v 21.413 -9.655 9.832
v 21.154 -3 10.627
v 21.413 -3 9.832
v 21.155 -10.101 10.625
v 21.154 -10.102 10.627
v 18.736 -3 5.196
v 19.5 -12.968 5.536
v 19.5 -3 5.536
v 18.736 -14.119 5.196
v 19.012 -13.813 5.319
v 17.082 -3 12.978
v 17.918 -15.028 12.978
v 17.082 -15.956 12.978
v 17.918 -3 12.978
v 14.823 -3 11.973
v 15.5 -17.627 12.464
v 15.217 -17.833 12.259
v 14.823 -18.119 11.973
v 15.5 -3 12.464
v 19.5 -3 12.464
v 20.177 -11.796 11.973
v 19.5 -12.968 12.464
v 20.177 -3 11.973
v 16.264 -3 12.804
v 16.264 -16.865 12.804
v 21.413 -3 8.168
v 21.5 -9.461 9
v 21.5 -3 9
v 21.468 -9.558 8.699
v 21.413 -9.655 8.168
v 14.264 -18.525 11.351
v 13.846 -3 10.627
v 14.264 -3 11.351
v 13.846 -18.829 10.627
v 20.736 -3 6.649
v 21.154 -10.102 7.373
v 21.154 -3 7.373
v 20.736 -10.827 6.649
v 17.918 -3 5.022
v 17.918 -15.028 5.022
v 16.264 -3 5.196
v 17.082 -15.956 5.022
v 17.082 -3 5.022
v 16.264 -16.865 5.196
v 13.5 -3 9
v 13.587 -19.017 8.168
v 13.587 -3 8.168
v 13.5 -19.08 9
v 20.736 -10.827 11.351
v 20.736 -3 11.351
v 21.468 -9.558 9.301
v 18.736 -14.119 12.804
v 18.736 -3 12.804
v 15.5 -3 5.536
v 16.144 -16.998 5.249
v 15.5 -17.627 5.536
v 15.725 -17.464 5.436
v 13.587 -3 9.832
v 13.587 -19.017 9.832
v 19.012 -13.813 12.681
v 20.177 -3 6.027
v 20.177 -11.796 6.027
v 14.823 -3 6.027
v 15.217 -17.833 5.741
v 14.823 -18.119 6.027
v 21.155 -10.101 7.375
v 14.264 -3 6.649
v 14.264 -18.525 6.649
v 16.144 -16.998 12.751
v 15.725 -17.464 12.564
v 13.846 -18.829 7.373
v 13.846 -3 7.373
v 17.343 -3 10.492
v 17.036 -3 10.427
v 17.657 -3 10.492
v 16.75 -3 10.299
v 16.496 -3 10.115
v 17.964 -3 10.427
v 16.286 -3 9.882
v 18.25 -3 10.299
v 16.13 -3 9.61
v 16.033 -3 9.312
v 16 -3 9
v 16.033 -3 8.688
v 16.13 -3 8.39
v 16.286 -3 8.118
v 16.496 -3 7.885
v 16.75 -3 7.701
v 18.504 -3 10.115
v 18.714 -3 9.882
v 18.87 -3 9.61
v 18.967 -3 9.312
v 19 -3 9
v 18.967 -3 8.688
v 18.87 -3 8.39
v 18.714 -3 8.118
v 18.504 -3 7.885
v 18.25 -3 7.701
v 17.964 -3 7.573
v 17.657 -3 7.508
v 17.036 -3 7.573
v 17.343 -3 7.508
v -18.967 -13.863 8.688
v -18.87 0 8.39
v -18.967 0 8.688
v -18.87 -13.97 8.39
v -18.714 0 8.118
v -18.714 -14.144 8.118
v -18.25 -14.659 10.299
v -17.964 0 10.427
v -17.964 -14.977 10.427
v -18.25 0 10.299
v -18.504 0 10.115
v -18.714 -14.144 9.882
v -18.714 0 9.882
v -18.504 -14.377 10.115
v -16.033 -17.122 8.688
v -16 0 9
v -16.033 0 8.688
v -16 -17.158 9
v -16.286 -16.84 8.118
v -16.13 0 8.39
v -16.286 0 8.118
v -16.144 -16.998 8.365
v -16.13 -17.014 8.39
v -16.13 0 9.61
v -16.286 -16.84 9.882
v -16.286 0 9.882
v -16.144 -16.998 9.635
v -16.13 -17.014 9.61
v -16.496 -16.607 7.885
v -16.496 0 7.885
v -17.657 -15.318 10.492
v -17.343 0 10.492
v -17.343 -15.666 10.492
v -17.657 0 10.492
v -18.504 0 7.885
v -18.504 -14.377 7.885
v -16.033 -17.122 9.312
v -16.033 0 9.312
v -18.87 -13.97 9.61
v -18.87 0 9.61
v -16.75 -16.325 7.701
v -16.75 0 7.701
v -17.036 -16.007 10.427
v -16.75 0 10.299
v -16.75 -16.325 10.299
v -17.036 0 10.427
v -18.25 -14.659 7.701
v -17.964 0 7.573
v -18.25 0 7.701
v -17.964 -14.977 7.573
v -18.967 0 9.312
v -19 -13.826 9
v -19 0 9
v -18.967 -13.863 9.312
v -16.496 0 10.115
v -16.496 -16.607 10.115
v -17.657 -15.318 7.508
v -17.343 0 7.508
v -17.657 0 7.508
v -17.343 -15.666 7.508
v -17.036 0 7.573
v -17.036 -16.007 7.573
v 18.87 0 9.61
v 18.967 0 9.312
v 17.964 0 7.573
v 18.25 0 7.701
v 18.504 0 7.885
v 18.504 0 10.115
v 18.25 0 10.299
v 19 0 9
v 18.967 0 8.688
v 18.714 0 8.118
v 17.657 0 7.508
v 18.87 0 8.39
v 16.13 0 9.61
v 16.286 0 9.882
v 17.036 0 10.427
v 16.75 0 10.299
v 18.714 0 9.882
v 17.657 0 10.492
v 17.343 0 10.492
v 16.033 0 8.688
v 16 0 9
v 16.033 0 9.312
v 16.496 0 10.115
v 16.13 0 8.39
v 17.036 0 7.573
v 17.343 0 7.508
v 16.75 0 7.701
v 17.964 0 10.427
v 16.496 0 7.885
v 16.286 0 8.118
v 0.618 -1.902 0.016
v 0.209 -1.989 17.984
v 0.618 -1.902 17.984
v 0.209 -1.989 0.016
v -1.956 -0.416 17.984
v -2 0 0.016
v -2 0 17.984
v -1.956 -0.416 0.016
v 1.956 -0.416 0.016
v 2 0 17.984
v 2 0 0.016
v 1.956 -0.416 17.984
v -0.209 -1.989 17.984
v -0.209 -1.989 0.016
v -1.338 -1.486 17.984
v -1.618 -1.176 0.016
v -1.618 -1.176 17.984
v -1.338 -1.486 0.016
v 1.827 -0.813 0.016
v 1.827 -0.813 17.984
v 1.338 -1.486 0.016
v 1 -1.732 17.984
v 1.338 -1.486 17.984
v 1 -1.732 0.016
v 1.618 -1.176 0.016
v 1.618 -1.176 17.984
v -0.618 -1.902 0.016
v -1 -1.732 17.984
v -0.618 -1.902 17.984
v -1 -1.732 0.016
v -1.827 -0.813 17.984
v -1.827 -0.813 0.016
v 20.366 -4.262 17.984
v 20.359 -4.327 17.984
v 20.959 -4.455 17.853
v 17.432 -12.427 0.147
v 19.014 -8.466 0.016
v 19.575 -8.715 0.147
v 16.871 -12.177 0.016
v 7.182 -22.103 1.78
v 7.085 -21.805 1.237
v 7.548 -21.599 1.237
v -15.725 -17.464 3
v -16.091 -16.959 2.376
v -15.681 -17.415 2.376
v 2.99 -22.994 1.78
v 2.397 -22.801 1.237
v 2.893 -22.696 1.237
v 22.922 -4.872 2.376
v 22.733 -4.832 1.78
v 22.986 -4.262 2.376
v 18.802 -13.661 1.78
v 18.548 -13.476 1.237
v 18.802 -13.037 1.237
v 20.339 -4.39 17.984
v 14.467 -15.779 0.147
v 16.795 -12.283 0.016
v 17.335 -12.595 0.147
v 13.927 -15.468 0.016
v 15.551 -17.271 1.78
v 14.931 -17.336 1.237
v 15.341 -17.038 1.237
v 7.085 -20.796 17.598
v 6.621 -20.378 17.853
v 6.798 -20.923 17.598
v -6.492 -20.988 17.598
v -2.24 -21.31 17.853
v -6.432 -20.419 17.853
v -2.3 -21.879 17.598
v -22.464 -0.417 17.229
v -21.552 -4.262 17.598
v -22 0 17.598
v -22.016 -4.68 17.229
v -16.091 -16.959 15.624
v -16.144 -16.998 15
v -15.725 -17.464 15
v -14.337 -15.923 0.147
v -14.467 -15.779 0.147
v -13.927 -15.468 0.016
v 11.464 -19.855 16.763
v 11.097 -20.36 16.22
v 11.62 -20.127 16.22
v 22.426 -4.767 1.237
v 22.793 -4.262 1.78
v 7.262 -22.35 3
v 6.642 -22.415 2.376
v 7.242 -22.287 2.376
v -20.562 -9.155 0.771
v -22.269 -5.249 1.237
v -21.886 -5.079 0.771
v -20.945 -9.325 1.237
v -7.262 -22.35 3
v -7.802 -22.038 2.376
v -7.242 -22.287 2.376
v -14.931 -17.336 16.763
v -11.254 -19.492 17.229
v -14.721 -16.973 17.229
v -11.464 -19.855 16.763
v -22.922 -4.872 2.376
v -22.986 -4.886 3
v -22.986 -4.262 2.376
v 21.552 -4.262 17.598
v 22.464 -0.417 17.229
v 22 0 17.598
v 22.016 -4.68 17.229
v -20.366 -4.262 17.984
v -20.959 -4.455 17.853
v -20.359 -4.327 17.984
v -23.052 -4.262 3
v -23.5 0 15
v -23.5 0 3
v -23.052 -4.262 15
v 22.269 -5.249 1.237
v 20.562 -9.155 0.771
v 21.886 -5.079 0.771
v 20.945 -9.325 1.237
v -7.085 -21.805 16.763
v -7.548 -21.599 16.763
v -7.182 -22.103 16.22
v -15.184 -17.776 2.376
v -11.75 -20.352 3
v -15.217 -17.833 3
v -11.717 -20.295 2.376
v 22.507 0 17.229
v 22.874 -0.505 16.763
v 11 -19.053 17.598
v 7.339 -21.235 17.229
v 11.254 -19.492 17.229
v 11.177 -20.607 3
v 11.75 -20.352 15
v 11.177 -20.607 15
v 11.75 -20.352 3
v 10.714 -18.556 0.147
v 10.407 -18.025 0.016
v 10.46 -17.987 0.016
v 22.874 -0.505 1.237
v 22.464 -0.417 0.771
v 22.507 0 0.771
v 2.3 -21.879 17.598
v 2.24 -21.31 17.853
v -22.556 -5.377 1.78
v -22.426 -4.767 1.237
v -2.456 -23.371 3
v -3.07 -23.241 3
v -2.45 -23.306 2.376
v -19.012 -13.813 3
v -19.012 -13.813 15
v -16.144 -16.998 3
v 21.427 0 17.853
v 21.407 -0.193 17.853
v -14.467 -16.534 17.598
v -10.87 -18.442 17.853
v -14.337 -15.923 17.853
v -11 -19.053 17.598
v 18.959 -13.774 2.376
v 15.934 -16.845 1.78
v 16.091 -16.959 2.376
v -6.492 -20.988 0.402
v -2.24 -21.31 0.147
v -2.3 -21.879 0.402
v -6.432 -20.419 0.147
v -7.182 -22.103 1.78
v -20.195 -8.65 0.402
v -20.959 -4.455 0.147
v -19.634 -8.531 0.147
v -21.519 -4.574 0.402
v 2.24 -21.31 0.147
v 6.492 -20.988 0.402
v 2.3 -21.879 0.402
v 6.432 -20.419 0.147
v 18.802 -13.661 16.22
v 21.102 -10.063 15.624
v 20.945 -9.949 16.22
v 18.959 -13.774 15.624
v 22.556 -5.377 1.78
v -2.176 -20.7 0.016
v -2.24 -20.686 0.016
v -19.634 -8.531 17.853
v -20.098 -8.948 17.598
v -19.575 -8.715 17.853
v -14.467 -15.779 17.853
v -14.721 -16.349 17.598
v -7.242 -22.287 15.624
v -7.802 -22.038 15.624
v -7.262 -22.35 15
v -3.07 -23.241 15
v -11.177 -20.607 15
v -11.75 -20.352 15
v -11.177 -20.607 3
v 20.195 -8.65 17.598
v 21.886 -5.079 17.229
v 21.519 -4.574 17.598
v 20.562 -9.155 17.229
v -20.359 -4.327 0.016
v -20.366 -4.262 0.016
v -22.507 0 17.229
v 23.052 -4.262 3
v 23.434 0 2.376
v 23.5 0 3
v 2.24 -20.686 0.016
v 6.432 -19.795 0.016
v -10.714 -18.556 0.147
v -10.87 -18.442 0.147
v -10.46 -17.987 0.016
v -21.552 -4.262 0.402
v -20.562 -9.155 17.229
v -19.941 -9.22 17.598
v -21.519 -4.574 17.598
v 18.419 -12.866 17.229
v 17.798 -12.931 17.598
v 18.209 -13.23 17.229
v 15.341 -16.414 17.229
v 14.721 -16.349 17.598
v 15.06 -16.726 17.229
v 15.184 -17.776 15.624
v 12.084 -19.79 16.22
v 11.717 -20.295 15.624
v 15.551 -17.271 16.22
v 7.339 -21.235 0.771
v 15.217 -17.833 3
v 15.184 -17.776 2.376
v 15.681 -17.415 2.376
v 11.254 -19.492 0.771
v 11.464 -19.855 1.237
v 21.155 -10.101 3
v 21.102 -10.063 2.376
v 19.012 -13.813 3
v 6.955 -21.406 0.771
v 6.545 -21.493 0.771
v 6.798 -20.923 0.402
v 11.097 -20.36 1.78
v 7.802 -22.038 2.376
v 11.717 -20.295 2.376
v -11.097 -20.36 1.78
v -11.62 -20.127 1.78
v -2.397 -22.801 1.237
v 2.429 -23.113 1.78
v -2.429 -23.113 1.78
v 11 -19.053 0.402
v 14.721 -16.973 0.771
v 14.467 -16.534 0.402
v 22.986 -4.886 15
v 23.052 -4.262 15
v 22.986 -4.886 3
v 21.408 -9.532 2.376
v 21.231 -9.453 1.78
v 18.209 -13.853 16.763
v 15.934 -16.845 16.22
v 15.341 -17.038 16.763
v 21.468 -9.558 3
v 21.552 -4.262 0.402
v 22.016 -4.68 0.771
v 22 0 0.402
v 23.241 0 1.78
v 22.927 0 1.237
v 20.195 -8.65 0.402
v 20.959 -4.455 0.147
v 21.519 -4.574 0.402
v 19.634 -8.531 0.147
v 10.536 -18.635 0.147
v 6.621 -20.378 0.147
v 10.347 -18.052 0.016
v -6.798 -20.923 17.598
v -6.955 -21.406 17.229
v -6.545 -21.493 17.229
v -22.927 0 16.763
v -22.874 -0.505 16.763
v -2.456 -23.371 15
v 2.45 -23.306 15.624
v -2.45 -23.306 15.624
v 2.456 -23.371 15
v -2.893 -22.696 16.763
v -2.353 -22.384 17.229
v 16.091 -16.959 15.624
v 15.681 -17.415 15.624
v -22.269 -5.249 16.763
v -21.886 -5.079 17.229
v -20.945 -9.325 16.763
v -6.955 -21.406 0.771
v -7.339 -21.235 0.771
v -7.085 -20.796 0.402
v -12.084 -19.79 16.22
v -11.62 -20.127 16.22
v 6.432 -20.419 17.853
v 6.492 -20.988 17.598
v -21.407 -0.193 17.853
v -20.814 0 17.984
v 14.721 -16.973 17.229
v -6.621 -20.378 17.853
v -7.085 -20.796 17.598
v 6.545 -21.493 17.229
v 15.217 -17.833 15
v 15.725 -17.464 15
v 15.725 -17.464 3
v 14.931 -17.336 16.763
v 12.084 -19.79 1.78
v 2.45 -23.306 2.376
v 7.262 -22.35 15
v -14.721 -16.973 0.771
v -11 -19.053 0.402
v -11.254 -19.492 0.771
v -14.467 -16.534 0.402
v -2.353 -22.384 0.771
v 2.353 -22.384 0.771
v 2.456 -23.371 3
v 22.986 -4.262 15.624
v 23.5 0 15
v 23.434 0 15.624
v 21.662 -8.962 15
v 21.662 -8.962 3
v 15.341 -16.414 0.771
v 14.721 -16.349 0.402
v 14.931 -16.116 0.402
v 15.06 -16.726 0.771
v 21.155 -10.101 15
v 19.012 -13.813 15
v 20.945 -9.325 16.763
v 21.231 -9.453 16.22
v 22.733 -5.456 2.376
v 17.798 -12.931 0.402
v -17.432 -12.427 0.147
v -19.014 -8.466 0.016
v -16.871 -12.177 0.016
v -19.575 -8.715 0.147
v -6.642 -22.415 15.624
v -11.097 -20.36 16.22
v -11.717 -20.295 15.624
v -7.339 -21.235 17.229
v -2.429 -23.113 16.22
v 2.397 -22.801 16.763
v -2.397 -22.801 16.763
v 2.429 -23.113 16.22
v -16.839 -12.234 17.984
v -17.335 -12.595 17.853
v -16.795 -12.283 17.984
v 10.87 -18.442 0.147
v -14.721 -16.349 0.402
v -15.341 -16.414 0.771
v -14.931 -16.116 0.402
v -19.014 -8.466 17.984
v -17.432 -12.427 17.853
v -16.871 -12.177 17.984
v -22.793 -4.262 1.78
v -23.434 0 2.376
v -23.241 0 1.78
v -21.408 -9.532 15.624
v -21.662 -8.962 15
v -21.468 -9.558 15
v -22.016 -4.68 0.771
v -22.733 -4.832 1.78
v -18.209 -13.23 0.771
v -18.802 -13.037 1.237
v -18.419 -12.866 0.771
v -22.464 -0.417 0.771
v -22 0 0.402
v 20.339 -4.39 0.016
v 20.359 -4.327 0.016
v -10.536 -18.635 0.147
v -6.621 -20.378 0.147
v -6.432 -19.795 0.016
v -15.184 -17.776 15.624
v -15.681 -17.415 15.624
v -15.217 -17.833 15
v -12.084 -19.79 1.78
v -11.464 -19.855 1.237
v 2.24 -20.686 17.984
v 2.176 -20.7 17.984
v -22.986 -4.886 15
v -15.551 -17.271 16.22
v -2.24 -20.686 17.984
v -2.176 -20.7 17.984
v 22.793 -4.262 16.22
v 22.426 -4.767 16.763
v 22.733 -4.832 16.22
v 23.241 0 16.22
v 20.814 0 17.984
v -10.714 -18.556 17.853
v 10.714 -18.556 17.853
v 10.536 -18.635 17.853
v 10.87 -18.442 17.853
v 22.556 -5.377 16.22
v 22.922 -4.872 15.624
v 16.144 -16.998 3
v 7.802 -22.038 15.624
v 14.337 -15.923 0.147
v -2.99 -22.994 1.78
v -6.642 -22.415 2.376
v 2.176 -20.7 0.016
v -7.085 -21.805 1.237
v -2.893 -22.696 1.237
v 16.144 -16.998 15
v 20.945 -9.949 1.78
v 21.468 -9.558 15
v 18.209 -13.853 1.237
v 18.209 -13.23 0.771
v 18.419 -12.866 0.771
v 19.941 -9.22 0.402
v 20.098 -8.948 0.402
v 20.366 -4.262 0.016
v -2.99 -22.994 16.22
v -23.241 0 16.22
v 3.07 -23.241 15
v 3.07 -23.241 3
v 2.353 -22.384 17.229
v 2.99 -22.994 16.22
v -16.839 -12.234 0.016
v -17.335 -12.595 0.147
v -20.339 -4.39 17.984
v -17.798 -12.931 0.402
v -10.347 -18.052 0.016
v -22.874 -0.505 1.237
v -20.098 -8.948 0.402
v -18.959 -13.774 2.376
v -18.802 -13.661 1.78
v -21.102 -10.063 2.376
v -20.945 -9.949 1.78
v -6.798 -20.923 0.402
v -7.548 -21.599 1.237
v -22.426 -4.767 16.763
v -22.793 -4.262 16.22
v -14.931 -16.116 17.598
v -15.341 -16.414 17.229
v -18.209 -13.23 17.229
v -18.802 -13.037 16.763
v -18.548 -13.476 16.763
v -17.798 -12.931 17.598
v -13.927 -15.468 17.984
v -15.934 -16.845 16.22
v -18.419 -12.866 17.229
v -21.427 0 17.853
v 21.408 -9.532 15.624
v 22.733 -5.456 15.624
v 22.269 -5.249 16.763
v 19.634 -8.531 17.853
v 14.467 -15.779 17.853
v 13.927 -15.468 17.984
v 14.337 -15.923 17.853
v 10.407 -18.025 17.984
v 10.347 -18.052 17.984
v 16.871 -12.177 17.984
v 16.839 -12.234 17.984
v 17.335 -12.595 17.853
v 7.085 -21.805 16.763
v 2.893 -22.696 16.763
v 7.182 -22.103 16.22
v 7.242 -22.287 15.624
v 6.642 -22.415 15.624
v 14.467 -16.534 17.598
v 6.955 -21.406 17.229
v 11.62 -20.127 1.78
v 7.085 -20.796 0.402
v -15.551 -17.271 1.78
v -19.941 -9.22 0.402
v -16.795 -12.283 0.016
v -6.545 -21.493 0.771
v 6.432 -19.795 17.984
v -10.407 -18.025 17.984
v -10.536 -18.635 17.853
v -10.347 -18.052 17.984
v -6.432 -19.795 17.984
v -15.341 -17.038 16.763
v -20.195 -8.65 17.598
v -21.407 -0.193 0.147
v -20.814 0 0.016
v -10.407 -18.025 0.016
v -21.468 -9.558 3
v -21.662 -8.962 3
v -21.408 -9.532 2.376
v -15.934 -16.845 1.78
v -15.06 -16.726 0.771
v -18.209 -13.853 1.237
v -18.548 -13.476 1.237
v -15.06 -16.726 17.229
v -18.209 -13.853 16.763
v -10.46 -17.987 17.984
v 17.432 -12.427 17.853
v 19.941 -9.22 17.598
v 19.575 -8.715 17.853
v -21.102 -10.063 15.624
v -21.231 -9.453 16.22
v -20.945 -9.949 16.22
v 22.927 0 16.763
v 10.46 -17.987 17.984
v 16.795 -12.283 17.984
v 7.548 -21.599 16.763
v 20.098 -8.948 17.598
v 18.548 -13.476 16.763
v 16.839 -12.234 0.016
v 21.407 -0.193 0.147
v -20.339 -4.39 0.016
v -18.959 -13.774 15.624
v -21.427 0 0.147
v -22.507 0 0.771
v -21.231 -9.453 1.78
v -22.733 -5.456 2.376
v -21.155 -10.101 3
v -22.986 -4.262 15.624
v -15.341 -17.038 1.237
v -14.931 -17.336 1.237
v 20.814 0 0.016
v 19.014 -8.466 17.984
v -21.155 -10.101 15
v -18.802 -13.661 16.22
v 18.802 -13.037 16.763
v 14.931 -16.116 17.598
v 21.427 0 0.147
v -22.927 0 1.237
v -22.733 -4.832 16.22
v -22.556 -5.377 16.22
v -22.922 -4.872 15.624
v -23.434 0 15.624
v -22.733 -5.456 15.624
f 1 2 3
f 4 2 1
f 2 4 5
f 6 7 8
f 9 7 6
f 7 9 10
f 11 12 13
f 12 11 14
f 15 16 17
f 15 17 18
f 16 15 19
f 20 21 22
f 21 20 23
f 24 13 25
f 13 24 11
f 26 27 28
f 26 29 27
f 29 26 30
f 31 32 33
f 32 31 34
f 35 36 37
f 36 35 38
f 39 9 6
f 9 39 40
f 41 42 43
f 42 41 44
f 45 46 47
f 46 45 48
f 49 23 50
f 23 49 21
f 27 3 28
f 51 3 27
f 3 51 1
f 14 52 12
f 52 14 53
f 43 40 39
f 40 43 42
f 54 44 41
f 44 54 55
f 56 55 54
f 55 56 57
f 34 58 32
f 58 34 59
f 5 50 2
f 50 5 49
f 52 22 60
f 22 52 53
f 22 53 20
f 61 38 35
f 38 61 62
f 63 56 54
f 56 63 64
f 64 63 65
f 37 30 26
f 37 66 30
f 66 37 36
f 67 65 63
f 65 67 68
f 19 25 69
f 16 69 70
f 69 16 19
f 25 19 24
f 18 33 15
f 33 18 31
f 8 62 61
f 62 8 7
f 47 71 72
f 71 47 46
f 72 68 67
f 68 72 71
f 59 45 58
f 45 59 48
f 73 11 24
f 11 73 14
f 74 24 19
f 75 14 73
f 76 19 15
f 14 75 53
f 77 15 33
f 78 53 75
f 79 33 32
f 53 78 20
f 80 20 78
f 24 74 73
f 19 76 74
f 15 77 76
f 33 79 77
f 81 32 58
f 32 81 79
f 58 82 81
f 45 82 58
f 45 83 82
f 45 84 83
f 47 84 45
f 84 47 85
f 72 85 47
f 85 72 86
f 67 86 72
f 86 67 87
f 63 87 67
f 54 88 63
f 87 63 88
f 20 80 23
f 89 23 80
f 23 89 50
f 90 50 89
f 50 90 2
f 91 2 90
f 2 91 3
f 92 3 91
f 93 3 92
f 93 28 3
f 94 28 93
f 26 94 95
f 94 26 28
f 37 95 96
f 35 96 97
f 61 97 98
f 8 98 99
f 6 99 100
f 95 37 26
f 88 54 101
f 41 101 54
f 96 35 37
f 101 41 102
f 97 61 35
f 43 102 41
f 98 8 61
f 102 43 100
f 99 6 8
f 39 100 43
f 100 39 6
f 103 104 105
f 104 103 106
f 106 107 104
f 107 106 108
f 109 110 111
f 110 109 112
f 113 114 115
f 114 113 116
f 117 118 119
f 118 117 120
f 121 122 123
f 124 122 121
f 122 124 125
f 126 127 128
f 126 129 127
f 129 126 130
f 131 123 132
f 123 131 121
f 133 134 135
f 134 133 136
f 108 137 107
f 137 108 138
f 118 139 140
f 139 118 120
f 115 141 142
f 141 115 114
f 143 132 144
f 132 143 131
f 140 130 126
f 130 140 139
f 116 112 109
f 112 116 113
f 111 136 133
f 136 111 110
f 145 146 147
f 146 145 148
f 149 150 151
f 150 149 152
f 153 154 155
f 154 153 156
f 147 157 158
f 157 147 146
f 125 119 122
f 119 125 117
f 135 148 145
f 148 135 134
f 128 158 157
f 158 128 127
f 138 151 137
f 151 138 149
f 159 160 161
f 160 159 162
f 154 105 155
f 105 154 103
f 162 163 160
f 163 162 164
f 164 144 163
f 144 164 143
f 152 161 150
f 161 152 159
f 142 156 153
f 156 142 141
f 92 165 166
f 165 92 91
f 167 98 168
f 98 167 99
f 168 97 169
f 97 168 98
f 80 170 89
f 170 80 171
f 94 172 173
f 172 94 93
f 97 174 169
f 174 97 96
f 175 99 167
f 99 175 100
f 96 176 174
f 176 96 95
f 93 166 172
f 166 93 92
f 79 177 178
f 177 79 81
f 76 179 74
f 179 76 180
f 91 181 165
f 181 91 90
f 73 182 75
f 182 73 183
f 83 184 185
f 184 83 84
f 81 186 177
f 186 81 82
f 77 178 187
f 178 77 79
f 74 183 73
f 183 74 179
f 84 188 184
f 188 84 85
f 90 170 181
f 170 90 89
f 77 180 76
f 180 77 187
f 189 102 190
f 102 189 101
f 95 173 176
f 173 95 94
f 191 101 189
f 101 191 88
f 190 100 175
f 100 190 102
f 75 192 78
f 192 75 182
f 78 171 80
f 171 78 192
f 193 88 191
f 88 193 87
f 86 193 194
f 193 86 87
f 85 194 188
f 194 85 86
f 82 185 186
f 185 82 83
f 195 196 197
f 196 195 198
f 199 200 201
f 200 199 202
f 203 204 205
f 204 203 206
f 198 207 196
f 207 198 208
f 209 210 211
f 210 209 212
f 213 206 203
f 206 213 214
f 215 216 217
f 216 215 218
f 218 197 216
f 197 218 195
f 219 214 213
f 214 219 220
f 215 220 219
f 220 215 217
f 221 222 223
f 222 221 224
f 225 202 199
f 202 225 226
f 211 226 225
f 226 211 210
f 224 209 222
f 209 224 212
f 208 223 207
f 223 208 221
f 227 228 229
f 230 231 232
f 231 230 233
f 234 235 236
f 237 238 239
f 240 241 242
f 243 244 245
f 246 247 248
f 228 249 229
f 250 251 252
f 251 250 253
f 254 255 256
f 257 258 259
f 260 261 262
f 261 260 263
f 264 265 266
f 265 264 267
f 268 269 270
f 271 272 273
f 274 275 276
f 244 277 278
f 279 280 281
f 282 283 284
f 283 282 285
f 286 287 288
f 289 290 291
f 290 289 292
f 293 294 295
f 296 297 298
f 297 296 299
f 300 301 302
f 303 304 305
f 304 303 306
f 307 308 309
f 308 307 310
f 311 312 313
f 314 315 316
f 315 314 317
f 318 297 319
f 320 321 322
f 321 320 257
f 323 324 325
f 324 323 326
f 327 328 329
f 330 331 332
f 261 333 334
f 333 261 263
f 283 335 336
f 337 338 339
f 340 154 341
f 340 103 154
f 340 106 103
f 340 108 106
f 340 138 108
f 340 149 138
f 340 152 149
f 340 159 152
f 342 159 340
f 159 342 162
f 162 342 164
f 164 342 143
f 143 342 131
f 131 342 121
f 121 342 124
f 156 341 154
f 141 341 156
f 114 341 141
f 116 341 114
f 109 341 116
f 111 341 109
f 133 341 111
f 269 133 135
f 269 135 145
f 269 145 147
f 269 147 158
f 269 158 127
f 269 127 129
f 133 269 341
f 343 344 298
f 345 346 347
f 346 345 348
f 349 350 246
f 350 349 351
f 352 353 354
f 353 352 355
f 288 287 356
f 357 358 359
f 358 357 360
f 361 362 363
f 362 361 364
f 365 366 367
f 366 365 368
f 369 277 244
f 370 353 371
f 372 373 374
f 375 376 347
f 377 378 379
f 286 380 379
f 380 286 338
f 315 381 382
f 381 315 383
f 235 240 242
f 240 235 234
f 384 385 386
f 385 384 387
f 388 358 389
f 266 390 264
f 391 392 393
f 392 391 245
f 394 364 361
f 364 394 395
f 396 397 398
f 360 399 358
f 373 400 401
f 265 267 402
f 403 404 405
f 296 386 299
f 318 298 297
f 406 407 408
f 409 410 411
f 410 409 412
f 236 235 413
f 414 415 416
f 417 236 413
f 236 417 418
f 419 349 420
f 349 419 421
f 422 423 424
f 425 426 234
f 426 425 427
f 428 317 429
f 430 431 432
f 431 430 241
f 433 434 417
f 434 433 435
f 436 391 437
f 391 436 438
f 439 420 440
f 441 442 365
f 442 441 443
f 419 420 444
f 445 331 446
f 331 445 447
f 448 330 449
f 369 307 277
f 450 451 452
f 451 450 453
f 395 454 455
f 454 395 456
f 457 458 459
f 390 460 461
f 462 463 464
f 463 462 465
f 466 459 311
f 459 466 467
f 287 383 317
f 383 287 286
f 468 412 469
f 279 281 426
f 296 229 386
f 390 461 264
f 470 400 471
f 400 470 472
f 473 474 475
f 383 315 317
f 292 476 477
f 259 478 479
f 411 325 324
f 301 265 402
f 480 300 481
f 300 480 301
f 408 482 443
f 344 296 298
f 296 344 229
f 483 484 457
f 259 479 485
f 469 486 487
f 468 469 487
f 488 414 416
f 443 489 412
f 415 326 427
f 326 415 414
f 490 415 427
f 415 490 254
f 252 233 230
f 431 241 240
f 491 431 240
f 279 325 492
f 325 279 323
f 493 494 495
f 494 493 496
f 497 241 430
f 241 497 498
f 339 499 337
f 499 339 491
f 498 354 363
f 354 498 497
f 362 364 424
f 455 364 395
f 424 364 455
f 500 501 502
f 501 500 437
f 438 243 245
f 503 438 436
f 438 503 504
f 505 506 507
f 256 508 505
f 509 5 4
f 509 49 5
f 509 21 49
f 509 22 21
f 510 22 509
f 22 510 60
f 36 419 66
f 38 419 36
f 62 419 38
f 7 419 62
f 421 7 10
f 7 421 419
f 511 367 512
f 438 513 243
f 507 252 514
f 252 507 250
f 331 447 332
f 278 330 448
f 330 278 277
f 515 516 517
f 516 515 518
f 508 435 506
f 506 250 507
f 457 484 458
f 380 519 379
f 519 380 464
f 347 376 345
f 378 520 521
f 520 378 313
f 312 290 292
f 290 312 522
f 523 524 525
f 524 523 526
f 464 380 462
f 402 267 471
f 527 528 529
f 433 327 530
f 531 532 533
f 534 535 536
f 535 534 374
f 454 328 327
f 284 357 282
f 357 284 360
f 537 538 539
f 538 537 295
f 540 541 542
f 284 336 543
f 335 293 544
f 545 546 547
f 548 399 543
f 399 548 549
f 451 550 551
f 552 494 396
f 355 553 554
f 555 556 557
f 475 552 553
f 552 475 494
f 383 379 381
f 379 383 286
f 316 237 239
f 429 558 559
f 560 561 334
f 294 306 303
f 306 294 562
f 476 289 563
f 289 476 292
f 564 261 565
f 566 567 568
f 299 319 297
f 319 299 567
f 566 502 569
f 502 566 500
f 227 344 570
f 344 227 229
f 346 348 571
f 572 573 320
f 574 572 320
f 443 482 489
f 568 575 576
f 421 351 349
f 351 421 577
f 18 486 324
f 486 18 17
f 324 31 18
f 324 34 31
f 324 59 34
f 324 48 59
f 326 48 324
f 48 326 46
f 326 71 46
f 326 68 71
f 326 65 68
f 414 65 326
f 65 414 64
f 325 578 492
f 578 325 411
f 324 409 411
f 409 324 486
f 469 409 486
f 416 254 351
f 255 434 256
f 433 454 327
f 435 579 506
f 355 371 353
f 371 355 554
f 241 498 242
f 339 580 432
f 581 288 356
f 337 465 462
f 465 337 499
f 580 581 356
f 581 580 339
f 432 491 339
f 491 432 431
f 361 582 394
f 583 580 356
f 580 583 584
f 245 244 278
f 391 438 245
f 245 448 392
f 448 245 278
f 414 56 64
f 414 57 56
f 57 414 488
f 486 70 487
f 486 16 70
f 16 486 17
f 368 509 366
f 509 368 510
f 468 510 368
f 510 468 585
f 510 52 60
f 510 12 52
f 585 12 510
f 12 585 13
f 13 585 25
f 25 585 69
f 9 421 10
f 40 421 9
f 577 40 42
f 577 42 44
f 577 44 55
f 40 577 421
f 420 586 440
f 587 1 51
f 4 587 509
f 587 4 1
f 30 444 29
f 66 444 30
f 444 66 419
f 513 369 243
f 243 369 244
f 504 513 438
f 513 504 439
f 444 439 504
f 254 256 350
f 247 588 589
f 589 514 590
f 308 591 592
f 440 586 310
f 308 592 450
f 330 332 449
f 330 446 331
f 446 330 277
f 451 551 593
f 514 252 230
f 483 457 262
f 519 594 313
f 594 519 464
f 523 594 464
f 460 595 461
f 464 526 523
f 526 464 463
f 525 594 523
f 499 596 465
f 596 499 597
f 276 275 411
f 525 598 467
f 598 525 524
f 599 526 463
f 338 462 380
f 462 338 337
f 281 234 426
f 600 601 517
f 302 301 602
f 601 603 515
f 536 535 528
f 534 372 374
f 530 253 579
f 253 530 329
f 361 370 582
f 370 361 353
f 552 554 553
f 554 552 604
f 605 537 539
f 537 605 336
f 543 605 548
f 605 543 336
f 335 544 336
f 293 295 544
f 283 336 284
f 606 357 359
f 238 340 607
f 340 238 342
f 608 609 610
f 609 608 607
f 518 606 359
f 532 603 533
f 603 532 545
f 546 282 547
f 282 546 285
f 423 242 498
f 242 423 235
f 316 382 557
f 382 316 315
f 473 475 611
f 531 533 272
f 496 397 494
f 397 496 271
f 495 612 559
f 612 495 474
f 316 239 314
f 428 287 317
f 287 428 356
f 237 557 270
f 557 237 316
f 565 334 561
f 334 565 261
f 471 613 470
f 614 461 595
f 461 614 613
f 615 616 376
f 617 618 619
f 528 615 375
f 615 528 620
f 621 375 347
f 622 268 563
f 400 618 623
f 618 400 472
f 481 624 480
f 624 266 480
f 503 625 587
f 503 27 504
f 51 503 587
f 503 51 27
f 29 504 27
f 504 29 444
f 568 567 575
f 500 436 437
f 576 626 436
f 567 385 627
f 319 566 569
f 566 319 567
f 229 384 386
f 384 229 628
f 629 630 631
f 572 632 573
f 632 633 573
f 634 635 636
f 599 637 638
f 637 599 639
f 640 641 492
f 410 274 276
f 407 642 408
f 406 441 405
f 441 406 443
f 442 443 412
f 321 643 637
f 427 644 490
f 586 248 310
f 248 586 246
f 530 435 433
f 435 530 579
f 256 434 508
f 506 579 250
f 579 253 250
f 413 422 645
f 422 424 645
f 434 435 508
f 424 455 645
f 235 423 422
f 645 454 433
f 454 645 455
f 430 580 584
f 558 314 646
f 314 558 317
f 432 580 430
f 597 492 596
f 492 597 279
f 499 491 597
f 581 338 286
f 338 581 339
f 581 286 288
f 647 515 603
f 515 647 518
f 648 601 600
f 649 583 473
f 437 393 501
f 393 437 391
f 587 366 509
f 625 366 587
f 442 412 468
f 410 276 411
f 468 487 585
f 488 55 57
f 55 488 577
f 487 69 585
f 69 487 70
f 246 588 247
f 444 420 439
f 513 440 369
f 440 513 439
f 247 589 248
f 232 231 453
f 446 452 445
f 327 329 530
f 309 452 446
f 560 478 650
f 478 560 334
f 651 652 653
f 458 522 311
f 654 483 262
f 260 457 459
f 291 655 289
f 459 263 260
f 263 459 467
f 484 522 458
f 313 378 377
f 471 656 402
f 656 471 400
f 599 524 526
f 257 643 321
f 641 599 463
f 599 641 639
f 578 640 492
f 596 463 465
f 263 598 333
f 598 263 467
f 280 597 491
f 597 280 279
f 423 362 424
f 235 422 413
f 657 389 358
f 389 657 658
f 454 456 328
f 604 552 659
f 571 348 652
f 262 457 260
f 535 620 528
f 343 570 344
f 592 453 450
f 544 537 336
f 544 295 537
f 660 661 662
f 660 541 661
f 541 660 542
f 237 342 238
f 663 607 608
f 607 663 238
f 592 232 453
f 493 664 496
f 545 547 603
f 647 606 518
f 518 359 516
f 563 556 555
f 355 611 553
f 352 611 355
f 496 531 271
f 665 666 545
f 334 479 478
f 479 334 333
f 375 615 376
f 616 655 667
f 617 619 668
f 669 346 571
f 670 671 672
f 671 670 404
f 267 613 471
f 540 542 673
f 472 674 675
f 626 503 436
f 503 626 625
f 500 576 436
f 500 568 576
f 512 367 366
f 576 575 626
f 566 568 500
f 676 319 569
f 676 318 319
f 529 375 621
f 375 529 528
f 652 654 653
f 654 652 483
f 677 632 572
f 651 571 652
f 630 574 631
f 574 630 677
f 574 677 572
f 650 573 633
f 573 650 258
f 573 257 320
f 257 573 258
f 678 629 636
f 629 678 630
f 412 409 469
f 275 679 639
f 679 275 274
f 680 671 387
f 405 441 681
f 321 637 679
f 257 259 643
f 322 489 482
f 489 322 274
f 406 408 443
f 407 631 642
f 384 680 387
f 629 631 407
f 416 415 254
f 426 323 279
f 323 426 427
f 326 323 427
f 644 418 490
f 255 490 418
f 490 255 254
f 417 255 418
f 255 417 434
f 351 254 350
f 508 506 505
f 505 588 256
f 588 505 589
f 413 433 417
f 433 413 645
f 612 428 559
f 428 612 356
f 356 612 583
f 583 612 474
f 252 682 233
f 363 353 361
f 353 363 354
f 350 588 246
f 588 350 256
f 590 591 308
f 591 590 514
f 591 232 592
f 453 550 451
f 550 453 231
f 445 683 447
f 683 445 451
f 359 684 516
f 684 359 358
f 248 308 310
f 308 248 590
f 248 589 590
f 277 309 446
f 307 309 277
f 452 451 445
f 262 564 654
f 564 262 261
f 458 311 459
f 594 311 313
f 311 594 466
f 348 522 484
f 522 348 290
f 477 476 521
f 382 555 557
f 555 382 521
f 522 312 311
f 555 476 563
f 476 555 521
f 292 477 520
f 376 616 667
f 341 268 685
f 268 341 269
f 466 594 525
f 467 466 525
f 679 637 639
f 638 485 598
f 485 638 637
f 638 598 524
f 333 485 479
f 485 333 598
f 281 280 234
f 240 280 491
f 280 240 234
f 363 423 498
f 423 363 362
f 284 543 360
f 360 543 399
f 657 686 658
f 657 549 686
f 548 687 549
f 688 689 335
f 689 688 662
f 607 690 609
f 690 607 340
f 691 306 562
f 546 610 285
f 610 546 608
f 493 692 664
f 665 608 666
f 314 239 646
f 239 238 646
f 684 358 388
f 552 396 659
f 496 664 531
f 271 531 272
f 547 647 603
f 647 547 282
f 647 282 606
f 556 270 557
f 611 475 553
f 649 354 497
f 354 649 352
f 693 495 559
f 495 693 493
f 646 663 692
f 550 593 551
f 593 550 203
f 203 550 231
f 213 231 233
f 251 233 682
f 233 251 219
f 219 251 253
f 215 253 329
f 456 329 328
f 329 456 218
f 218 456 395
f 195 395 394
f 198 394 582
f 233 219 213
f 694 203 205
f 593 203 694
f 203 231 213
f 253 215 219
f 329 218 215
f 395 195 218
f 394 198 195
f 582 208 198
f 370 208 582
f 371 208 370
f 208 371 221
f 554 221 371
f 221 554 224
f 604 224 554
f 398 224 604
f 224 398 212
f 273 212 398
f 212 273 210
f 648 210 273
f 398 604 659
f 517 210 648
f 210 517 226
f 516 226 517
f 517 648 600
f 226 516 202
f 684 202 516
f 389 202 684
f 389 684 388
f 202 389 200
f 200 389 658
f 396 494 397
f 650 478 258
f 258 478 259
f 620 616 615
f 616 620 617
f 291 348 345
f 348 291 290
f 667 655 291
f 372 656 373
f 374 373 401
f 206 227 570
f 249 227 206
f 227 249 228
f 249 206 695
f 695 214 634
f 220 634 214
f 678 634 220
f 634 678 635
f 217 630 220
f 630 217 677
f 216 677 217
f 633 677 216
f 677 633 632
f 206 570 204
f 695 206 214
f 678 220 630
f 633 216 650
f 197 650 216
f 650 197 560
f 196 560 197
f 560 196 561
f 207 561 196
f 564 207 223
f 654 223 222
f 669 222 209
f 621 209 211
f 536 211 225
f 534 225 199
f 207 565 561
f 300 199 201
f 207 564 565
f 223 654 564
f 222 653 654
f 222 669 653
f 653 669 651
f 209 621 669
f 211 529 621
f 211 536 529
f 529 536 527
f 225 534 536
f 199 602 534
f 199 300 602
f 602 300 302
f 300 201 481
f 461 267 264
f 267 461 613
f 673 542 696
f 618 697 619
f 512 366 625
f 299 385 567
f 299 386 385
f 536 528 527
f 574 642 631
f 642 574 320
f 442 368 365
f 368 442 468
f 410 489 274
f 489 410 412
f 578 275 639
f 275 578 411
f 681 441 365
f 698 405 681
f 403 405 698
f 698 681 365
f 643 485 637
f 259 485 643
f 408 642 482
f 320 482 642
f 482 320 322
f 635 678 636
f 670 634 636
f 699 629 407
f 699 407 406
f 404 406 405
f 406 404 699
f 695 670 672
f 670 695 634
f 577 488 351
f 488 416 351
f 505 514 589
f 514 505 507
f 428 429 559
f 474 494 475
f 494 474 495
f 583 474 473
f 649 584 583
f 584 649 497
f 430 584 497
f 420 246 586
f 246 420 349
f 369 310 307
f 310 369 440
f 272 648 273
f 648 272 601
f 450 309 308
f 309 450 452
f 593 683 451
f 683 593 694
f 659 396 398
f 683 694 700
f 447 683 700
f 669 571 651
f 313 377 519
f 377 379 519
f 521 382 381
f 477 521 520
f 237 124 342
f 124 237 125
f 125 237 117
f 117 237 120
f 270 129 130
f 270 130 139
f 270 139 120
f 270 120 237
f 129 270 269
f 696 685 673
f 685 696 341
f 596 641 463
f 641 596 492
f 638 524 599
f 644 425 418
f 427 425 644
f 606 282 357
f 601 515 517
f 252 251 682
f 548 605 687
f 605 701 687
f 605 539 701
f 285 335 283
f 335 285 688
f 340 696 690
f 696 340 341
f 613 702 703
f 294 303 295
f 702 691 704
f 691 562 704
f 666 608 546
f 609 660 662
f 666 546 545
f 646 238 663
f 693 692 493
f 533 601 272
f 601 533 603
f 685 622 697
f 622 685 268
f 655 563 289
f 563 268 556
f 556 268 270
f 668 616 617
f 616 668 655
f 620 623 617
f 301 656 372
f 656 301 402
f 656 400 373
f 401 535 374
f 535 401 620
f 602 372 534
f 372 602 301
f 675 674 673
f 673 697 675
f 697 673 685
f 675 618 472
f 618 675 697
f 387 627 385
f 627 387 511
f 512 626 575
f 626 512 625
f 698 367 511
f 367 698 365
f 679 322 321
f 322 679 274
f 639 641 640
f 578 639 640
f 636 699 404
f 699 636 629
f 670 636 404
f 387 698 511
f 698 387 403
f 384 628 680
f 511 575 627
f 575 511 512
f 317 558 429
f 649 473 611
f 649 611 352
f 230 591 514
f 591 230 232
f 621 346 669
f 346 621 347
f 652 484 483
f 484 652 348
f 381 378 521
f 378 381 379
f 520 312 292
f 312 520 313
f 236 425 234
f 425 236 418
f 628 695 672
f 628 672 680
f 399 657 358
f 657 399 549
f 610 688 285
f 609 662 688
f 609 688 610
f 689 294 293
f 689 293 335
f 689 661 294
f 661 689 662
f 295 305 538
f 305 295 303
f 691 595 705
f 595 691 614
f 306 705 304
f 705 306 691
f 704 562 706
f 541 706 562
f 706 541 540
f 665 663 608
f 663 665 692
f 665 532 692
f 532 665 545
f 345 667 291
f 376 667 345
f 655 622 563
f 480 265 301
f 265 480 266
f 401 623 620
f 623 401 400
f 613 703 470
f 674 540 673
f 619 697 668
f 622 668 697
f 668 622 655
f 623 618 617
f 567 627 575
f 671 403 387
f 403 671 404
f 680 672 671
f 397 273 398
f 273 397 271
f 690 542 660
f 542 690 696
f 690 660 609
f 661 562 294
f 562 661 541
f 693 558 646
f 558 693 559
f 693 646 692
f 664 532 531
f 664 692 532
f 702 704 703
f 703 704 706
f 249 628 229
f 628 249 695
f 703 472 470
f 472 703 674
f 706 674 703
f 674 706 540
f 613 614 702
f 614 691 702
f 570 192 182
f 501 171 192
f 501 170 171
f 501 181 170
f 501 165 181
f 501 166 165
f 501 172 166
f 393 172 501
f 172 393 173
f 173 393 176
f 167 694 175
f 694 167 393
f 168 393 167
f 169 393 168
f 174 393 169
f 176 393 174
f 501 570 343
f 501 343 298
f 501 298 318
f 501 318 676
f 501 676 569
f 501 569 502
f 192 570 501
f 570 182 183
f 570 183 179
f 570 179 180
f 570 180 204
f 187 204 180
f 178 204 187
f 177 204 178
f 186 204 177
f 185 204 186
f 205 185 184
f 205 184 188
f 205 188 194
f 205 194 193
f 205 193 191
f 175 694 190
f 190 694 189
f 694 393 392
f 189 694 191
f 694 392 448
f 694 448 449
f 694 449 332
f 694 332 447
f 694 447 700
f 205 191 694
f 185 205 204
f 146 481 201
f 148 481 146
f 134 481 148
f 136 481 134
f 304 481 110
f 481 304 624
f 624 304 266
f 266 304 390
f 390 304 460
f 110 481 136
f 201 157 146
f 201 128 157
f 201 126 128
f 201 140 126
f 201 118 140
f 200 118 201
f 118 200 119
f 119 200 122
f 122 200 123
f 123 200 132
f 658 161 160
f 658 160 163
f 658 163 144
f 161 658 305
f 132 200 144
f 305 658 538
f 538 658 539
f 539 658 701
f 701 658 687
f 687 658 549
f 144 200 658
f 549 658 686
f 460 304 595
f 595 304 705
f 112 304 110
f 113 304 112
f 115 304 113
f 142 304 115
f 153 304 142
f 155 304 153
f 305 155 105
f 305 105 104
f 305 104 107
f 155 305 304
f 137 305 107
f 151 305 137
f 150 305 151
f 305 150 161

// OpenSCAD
wheelWidth = 18;
wheelHoleSize = 4;
wheelOuter = 47;

screwOffsetFromEdge = wheelWidth / 3;

$fn = 30;


module fullWheel() {
    difference() {
        union() {
            translate([0,0,3]) {
                minkowski() {
                    cylinder(d=wheelOuter-6, h=wheelWidth-6 );
                    sphere(r=3);
                }
            }
        }
        union() {
            cylinder(d=wheelHoleSize, h=wheelWidth );
            
            // Add a M3 hole all the way through either side of the middle.
            
            rotate([90,0,0]) {
                // Screw head hollow out.
                translate([(wheelOuter/2 -screwOffsetFromEdge), wheelWidth/2, 3]) {
                    #cylinder(d=8, h= 25 );
                }
                
                // Through holes.
                translate([-(wheelOuter/2 -screwOffsetFromEdge), wheelWidth/2, -wheelOuter/2]) {
                    #cylinder(d=3, h=wheelOuter +10 );
                }
                
                translate([(wheelOuter/2 -screwOffsetFromEdge), wheelWidth/2, -wheelOuter/2]) {
                    #cylinder(d=3, h=wheelOuter +10 );
                }
            }
            translate([-(wheelOuter +10), 0, 0]) {
            }
        }
    }
}

difference() {
    union() {
        fullWheel();
    }
    union() {
        // Chop off half the wheel 
        translate([-(wheelOuter/2), 0, 0]) {
            cube([wheelOuter, wheelOuter, wheelWidth]);
        }
    }
}
